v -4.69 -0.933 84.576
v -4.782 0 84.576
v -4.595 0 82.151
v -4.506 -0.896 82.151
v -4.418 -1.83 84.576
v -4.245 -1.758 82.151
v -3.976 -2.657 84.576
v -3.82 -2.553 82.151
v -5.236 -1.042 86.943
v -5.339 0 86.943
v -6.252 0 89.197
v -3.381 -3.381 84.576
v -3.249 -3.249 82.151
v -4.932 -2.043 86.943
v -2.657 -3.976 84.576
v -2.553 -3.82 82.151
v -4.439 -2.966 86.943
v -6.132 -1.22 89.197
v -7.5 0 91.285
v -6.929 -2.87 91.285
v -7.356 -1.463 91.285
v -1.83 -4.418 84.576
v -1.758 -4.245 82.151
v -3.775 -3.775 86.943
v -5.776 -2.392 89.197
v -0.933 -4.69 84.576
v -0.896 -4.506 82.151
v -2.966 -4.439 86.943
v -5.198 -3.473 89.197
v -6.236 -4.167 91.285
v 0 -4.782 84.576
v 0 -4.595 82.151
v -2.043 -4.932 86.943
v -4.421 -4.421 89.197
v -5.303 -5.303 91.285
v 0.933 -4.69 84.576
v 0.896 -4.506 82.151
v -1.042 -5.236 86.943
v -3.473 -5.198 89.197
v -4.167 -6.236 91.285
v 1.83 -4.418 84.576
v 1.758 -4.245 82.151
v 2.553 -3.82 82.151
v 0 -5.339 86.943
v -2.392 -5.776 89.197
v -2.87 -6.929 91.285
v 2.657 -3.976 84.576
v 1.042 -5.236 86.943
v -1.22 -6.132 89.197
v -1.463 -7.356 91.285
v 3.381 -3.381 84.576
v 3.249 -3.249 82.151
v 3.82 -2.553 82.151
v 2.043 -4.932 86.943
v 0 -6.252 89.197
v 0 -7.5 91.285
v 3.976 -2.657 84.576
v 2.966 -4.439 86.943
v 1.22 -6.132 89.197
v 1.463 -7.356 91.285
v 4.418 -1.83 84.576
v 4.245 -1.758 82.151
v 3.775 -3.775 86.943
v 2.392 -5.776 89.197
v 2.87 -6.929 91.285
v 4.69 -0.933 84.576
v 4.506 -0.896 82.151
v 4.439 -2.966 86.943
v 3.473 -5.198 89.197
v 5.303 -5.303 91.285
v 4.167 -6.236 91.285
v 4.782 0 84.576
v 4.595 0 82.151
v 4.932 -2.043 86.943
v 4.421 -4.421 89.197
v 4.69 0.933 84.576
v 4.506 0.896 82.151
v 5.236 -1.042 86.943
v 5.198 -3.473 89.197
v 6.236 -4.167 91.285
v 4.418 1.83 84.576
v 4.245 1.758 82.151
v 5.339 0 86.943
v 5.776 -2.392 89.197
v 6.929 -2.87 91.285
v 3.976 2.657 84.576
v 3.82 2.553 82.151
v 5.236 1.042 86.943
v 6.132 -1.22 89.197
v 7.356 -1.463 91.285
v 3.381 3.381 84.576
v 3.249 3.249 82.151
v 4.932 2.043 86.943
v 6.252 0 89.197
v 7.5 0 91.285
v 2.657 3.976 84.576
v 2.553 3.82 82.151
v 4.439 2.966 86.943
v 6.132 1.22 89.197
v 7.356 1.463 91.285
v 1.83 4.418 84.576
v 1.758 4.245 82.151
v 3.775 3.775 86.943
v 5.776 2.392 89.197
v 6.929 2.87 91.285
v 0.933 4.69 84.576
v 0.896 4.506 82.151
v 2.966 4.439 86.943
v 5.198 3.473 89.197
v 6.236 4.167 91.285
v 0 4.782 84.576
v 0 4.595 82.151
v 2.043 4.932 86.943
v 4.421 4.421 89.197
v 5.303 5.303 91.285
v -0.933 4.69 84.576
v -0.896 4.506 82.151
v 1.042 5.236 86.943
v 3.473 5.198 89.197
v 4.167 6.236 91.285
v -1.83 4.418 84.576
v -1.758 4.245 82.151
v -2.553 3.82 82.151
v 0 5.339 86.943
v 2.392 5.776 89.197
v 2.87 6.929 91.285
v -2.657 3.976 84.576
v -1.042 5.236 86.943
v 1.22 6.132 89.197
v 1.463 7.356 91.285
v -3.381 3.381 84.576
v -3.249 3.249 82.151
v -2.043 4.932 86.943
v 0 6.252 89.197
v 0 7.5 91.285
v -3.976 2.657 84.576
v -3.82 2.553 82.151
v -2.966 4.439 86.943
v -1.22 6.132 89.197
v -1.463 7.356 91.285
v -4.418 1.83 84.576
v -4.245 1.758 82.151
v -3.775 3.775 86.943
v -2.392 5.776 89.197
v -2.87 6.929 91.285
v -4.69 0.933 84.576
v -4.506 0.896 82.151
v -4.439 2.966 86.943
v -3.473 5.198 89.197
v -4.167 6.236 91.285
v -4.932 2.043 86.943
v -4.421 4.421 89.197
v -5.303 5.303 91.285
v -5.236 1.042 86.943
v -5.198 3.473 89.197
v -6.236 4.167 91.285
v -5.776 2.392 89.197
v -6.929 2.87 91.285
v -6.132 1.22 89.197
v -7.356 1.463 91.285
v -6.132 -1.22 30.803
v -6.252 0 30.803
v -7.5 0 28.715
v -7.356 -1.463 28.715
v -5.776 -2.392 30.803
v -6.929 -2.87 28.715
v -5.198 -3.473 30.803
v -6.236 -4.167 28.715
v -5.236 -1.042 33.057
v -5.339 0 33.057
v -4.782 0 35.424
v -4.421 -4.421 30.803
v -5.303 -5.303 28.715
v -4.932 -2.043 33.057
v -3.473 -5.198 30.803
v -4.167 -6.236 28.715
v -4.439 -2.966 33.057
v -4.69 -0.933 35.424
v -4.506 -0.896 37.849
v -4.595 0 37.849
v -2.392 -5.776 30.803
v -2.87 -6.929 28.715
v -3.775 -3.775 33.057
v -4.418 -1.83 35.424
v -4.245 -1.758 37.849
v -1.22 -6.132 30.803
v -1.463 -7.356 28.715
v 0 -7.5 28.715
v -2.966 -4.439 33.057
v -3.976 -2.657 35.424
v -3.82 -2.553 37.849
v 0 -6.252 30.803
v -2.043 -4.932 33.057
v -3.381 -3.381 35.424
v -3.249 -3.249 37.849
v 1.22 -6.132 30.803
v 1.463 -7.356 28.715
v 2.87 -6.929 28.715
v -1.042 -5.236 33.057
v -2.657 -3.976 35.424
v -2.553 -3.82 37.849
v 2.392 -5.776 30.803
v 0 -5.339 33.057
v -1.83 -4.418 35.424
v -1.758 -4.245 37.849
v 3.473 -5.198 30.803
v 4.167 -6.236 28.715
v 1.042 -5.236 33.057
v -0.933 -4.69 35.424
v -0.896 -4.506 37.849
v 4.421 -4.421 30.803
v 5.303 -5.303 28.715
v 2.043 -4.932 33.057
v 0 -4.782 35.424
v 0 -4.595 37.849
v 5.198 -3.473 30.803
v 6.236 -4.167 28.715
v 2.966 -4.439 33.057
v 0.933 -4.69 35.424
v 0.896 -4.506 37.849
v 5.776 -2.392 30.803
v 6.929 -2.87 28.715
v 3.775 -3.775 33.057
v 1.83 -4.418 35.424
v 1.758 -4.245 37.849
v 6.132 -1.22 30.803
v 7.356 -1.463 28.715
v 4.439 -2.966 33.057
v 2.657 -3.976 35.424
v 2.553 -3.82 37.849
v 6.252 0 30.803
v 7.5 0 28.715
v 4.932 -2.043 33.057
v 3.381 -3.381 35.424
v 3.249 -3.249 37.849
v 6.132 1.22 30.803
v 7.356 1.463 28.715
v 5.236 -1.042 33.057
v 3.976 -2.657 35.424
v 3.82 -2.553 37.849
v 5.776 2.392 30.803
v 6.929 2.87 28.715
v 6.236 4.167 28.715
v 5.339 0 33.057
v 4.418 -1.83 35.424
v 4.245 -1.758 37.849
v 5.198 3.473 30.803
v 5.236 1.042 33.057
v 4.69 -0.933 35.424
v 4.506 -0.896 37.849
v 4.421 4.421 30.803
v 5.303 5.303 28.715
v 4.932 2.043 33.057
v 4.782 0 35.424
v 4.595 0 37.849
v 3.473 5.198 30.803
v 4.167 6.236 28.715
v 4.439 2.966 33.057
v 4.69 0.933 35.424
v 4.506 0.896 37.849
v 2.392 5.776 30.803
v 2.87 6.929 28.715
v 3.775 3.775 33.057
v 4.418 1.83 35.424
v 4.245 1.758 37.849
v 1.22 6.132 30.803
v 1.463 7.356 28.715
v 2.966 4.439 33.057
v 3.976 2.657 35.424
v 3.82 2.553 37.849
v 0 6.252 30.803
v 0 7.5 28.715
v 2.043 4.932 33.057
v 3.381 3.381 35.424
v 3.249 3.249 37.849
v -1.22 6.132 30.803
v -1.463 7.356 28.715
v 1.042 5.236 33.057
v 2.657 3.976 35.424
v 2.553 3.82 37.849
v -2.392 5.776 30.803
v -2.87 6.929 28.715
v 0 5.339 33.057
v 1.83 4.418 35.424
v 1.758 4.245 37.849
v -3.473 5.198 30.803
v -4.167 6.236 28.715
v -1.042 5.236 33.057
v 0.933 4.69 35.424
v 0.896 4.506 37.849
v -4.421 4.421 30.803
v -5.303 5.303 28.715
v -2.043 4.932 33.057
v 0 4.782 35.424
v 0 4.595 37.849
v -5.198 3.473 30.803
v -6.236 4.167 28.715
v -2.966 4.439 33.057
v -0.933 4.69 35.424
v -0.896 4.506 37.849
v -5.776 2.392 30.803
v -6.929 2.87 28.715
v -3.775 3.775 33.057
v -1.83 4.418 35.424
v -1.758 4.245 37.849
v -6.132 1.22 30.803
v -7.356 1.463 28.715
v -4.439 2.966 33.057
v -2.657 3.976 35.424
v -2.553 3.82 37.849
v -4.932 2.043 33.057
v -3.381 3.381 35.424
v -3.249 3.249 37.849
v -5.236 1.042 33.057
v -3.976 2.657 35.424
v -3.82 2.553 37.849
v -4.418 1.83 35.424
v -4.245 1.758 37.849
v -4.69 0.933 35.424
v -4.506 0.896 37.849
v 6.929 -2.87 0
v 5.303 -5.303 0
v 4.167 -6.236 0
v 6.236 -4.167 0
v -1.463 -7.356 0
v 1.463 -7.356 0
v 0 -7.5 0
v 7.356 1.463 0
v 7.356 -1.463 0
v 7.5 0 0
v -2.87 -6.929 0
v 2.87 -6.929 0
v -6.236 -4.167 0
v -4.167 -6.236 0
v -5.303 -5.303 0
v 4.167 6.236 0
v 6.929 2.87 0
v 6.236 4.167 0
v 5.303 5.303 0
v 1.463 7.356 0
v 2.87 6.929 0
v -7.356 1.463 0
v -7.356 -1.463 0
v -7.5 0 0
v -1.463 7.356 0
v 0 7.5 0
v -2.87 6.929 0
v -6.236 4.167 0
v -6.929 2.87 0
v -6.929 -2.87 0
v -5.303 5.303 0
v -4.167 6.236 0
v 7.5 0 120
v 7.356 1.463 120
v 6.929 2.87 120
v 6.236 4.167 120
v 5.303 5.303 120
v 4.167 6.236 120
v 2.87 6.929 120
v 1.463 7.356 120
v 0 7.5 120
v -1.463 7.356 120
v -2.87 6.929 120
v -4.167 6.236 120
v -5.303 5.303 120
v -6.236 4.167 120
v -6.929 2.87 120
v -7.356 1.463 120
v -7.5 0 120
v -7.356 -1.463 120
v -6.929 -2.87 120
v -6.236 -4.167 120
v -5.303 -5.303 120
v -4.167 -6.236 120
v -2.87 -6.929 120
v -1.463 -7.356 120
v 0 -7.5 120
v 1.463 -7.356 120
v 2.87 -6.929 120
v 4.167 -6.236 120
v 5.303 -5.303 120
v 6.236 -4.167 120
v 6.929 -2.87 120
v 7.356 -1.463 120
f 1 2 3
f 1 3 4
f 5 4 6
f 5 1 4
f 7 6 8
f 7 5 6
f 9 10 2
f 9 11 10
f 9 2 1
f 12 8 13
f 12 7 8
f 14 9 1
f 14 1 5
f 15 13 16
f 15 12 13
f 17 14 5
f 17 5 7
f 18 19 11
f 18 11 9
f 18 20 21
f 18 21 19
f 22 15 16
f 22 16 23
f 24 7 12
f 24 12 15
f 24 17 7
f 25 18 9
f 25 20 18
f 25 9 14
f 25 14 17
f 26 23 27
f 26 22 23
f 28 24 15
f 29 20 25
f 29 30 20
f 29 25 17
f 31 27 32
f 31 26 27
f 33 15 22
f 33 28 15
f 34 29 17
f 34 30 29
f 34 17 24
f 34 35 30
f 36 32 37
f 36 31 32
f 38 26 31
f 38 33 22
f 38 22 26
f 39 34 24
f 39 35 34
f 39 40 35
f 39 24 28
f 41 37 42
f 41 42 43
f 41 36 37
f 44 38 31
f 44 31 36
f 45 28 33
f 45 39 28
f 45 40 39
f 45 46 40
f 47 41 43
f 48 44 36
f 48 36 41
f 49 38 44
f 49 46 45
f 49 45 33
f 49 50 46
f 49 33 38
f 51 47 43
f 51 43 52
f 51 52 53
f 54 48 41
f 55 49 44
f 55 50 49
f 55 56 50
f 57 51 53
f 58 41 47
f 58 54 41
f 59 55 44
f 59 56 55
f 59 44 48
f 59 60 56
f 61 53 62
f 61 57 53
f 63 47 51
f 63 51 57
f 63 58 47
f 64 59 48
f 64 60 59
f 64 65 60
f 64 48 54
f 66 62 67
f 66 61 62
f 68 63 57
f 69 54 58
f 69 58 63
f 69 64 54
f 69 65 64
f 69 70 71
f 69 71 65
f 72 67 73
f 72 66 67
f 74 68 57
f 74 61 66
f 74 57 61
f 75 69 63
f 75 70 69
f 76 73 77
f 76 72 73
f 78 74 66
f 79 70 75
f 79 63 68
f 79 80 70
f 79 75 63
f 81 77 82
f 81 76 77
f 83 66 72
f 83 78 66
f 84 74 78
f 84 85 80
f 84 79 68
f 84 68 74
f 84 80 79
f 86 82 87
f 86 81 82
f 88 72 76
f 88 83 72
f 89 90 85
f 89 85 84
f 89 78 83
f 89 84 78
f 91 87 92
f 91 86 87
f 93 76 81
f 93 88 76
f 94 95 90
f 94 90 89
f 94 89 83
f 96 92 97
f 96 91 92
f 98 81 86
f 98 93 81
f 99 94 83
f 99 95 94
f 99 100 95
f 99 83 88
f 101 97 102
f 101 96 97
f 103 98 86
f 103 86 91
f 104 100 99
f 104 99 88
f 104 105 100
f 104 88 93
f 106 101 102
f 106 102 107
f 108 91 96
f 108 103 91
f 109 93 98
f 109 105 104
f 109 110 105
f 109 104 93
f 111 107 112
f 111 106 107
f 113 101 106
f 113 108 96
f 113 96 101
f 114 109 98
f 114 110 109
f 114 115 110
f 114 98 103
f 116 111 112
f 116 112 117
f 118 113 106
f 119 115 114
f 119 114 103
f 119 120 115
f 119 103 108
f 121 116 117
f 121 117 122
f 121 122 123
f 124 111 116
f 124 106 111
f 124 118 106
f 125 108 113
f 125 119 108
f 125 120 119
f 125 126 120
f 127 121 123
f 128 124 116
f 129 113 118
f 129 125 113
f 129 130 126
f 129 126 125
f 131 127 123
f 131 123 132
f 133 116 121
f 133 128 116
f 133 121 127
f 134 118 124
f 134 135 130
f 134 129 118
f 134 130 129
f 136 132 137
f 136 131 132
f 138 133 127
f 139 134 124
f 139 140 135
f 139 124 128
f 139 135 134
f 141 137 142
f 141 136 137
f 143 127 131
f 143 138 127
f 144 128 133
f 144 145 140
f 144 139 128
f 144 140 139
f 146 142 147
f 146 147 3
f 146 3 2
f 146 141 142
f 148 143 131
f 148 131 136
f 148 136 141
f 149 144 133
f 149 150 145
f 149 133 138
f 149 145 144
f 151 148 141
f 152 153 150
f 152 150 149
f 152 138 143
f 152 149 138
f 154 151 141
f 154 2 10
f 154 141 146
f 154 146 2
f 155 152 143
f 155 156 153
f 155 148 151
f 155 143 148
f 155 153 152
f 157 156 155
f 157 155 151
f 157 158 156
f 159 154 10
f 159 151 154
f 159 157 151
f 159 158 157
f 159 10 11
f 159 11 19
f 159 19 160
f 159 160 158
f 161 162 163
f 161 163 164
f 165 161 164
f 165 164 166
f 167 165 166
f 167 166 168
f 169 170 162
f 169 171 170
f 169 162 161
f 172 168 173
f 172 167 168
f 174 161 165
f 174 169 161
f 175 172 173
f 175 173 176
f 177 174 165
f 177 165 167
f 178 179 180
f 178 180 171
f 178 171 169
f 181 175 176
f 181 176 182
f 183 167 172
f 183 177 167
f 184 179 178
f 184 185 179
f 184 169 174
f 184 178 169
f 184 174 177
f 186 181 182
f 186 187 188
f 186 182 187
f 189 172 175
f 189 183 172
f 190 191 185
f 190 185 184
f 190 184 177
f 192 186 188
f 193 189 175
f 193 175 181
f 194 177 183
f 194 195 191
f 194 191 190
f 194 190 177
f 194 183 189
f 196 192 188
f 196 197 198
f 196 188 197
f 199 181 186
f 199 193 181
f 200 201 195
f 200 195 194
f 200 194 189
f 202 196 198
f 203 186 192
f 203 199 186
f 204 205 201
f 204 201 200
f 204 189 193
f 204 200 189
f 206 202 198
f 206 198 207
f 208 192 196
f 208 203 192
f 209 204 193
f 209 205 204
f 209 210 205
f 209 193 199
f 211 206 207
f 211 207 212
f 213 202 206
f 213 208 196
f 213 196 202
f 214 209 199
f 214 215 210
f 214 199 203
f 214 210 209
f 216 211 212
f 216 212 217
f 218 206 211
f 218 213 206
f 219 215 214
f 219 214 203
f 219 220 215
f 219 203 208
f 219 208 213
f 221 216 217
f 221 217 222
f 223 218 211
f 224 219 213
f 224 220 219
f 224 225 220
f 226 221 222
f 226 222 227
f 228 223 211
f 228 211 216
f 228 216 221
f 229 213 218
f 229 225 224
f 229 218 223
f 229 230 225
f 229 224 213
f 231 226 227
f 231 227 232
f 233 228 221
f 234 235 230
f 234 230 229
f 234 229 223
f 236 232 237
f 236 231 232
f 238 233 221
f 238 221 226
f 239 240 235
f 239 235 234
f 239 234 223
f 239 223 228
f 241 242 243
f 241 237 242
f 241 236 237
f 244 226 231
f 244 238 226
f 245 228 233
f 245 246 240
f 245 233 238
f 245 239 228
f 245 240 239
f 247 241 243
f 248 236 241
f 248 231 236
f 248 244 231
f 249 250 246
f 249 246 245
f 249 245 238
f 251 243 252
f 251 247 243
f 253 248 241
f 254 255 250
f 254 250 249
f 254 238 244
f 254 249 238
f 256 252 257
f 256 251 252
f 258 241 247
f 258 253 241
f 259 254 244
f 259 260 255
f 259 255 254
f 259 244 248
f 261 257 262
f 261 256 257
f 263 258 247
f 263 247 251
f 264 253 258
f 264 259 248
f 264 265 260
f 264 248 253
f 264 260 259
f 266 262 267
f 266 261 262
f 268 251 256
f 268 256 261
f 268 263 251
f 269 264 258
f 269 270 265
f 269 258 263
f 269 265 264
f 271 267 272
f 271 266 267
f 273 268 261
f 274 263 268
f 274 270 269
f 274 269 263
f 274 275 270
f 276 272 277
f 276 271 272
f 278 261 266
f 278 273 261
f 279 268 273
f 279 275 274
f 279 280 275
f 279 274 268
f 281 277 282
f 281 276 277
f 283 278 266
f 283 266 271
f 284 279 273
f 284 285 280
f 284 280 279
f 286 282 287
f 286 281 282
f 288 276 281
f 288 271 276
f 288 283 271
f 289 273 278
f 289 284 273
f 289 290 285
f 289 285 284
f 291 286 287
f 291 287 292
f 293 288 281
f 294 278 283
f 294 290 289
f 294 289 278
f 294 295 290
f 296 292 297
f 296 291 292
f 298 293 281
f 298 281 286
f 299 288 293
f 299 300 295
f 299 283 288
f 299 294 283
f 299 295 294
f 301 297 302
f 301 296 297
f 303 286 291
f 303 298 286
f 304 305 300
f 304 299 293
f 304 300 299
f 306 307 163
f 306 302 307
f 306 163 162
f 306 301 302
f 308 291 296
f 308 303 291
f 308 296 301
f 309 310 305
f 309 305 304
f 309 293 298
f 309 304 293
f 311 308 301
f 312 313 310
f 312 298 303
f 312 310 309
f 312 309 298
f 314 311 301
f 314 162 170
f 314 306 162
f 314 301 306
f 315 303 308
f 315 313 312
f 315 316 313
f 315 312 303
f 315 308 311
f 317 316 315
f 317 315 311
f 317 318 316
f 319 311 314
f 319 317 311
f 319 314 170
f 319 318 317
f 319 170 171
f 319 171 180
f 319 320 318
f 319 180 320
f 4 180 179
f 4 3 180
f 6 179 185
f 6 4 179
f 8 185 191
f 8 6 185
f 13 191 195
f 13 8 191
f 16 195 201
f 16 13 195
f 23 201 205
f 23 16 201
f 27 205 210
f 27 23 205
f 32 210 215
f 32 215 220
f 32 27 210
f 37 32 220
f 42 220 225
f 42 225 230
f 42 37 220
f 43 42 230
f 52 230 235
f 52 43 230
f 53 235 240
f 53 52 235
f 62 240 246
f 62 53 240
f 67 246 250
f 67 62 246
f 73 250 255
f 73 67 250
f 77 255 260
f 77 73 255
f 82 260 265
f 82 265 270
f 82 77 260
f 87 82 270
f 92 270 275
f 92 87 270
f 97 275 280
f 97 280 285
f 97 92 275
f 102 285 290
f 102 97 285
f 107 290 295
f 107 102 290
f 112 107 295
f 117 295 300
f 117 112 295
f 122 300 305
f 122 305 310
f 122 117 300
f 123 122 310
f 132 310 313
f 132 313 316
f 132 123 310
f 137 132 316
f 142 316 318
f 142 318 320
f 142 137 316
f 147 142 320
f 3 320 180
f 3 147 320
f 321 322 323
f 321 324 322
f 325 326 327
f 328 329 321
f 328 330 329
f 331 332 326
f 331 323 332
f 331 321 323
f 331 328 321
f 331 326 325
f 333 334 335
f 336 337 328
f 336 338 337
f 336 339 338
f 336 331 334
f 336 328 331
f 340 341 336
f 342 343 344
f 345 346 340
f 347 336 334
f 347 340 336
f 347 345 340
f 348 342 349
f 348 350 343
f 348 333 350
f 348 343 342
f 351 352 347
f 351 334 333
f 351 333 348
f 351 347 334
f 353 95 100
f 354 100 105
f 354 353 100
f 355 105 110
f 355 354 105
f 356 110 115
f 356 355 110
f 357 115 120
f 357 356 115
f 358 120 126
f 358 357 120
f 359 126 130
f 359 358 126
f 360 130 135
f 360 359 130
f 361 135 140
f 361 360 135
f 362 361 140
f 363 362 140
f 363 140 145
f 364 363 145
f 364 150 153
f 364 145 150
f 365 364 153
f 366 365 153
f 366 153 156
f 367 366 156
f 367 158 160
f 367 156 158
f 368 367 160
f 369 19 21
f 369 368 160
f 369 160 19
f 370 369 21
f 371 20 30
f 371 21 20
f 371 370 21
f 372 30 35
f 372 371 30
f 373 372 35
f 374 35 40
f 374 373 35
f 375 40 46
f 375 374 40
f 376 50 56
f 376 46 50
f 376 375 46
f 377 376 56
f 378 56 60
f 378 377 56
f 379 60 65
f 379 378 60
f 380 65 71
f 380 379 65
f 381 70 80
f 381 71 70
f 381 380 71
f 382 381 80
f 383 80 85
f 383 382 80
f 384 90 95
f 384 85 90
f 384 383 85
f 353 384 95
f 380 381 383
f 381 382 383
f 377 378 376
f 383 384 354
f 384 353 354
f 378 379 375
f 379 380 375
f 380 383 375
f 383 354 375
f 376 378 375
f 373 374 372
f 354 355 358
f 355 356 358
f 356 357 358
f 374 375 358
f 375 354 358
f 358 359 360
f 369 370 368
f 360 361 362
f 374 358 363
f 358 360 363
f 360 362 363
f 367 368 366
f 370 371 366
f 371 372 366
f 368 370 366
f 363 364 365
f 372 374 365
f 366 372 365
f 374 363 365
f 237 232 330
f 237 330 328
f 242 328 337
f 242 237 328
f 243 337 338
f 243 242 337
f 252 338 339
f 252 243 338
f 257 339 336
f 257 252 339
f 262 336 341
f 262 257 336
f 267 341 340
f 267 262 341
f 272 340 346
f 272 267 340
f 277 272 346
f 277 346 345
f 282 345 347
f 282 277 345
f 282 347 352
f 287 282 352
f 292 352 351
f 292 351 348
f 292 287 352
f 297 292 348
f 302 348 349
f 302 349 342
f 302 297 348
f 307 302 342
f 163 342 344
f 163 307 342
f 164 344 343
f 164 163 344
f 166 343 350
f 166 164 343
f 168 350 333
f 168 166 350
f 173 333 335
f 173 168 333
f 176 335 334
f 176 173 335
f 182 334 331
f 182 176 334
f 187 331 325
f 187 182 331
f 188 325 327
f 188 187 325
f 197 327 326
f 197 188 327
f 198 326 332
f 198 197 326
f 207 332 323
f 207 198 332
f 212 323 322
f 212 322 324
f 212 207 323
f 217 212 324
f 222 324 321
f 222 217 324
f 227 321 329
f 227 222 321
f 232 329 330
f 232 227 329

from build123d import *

# Parameters (mm, degrees)
F0_W = 7.5
F0_H = 120


with BuildPart() as f1:
    # F0 (on Front) → F1 (revolve)
    with BuildSketch(Plane.XZ):
        with Locations((3.75, 60)):
            Rectangle(F0_W, F0_H)
    revolve(axis=Axis((0, 0, 60), (0, 0, 1)))

    # F2 (on Front) → F3 (revolve, cut)
    with BuildSketch(Plane.XZ):
        with BuildLine():
            ThreePointArc((-20.40513, 22.038545), (-9.22552, 26.669291), (-4.594774, 37.848901))
            Line((-4.594774, 37.848901), (-4.594774, 82.151099))
            ThreePointArc((-4.594774, 82.151099), (-9.22552, 93.330709), (-20.40513, 97.961455))
            Line((-20.40513, 97.961455), (-20.40513, 22.038545))
        make_face()
    revolve(axis=Axis((0, 0, 57.177005), (0, 0, 1)), mode=Mode.SUBTRACT)


solid = f1.part
